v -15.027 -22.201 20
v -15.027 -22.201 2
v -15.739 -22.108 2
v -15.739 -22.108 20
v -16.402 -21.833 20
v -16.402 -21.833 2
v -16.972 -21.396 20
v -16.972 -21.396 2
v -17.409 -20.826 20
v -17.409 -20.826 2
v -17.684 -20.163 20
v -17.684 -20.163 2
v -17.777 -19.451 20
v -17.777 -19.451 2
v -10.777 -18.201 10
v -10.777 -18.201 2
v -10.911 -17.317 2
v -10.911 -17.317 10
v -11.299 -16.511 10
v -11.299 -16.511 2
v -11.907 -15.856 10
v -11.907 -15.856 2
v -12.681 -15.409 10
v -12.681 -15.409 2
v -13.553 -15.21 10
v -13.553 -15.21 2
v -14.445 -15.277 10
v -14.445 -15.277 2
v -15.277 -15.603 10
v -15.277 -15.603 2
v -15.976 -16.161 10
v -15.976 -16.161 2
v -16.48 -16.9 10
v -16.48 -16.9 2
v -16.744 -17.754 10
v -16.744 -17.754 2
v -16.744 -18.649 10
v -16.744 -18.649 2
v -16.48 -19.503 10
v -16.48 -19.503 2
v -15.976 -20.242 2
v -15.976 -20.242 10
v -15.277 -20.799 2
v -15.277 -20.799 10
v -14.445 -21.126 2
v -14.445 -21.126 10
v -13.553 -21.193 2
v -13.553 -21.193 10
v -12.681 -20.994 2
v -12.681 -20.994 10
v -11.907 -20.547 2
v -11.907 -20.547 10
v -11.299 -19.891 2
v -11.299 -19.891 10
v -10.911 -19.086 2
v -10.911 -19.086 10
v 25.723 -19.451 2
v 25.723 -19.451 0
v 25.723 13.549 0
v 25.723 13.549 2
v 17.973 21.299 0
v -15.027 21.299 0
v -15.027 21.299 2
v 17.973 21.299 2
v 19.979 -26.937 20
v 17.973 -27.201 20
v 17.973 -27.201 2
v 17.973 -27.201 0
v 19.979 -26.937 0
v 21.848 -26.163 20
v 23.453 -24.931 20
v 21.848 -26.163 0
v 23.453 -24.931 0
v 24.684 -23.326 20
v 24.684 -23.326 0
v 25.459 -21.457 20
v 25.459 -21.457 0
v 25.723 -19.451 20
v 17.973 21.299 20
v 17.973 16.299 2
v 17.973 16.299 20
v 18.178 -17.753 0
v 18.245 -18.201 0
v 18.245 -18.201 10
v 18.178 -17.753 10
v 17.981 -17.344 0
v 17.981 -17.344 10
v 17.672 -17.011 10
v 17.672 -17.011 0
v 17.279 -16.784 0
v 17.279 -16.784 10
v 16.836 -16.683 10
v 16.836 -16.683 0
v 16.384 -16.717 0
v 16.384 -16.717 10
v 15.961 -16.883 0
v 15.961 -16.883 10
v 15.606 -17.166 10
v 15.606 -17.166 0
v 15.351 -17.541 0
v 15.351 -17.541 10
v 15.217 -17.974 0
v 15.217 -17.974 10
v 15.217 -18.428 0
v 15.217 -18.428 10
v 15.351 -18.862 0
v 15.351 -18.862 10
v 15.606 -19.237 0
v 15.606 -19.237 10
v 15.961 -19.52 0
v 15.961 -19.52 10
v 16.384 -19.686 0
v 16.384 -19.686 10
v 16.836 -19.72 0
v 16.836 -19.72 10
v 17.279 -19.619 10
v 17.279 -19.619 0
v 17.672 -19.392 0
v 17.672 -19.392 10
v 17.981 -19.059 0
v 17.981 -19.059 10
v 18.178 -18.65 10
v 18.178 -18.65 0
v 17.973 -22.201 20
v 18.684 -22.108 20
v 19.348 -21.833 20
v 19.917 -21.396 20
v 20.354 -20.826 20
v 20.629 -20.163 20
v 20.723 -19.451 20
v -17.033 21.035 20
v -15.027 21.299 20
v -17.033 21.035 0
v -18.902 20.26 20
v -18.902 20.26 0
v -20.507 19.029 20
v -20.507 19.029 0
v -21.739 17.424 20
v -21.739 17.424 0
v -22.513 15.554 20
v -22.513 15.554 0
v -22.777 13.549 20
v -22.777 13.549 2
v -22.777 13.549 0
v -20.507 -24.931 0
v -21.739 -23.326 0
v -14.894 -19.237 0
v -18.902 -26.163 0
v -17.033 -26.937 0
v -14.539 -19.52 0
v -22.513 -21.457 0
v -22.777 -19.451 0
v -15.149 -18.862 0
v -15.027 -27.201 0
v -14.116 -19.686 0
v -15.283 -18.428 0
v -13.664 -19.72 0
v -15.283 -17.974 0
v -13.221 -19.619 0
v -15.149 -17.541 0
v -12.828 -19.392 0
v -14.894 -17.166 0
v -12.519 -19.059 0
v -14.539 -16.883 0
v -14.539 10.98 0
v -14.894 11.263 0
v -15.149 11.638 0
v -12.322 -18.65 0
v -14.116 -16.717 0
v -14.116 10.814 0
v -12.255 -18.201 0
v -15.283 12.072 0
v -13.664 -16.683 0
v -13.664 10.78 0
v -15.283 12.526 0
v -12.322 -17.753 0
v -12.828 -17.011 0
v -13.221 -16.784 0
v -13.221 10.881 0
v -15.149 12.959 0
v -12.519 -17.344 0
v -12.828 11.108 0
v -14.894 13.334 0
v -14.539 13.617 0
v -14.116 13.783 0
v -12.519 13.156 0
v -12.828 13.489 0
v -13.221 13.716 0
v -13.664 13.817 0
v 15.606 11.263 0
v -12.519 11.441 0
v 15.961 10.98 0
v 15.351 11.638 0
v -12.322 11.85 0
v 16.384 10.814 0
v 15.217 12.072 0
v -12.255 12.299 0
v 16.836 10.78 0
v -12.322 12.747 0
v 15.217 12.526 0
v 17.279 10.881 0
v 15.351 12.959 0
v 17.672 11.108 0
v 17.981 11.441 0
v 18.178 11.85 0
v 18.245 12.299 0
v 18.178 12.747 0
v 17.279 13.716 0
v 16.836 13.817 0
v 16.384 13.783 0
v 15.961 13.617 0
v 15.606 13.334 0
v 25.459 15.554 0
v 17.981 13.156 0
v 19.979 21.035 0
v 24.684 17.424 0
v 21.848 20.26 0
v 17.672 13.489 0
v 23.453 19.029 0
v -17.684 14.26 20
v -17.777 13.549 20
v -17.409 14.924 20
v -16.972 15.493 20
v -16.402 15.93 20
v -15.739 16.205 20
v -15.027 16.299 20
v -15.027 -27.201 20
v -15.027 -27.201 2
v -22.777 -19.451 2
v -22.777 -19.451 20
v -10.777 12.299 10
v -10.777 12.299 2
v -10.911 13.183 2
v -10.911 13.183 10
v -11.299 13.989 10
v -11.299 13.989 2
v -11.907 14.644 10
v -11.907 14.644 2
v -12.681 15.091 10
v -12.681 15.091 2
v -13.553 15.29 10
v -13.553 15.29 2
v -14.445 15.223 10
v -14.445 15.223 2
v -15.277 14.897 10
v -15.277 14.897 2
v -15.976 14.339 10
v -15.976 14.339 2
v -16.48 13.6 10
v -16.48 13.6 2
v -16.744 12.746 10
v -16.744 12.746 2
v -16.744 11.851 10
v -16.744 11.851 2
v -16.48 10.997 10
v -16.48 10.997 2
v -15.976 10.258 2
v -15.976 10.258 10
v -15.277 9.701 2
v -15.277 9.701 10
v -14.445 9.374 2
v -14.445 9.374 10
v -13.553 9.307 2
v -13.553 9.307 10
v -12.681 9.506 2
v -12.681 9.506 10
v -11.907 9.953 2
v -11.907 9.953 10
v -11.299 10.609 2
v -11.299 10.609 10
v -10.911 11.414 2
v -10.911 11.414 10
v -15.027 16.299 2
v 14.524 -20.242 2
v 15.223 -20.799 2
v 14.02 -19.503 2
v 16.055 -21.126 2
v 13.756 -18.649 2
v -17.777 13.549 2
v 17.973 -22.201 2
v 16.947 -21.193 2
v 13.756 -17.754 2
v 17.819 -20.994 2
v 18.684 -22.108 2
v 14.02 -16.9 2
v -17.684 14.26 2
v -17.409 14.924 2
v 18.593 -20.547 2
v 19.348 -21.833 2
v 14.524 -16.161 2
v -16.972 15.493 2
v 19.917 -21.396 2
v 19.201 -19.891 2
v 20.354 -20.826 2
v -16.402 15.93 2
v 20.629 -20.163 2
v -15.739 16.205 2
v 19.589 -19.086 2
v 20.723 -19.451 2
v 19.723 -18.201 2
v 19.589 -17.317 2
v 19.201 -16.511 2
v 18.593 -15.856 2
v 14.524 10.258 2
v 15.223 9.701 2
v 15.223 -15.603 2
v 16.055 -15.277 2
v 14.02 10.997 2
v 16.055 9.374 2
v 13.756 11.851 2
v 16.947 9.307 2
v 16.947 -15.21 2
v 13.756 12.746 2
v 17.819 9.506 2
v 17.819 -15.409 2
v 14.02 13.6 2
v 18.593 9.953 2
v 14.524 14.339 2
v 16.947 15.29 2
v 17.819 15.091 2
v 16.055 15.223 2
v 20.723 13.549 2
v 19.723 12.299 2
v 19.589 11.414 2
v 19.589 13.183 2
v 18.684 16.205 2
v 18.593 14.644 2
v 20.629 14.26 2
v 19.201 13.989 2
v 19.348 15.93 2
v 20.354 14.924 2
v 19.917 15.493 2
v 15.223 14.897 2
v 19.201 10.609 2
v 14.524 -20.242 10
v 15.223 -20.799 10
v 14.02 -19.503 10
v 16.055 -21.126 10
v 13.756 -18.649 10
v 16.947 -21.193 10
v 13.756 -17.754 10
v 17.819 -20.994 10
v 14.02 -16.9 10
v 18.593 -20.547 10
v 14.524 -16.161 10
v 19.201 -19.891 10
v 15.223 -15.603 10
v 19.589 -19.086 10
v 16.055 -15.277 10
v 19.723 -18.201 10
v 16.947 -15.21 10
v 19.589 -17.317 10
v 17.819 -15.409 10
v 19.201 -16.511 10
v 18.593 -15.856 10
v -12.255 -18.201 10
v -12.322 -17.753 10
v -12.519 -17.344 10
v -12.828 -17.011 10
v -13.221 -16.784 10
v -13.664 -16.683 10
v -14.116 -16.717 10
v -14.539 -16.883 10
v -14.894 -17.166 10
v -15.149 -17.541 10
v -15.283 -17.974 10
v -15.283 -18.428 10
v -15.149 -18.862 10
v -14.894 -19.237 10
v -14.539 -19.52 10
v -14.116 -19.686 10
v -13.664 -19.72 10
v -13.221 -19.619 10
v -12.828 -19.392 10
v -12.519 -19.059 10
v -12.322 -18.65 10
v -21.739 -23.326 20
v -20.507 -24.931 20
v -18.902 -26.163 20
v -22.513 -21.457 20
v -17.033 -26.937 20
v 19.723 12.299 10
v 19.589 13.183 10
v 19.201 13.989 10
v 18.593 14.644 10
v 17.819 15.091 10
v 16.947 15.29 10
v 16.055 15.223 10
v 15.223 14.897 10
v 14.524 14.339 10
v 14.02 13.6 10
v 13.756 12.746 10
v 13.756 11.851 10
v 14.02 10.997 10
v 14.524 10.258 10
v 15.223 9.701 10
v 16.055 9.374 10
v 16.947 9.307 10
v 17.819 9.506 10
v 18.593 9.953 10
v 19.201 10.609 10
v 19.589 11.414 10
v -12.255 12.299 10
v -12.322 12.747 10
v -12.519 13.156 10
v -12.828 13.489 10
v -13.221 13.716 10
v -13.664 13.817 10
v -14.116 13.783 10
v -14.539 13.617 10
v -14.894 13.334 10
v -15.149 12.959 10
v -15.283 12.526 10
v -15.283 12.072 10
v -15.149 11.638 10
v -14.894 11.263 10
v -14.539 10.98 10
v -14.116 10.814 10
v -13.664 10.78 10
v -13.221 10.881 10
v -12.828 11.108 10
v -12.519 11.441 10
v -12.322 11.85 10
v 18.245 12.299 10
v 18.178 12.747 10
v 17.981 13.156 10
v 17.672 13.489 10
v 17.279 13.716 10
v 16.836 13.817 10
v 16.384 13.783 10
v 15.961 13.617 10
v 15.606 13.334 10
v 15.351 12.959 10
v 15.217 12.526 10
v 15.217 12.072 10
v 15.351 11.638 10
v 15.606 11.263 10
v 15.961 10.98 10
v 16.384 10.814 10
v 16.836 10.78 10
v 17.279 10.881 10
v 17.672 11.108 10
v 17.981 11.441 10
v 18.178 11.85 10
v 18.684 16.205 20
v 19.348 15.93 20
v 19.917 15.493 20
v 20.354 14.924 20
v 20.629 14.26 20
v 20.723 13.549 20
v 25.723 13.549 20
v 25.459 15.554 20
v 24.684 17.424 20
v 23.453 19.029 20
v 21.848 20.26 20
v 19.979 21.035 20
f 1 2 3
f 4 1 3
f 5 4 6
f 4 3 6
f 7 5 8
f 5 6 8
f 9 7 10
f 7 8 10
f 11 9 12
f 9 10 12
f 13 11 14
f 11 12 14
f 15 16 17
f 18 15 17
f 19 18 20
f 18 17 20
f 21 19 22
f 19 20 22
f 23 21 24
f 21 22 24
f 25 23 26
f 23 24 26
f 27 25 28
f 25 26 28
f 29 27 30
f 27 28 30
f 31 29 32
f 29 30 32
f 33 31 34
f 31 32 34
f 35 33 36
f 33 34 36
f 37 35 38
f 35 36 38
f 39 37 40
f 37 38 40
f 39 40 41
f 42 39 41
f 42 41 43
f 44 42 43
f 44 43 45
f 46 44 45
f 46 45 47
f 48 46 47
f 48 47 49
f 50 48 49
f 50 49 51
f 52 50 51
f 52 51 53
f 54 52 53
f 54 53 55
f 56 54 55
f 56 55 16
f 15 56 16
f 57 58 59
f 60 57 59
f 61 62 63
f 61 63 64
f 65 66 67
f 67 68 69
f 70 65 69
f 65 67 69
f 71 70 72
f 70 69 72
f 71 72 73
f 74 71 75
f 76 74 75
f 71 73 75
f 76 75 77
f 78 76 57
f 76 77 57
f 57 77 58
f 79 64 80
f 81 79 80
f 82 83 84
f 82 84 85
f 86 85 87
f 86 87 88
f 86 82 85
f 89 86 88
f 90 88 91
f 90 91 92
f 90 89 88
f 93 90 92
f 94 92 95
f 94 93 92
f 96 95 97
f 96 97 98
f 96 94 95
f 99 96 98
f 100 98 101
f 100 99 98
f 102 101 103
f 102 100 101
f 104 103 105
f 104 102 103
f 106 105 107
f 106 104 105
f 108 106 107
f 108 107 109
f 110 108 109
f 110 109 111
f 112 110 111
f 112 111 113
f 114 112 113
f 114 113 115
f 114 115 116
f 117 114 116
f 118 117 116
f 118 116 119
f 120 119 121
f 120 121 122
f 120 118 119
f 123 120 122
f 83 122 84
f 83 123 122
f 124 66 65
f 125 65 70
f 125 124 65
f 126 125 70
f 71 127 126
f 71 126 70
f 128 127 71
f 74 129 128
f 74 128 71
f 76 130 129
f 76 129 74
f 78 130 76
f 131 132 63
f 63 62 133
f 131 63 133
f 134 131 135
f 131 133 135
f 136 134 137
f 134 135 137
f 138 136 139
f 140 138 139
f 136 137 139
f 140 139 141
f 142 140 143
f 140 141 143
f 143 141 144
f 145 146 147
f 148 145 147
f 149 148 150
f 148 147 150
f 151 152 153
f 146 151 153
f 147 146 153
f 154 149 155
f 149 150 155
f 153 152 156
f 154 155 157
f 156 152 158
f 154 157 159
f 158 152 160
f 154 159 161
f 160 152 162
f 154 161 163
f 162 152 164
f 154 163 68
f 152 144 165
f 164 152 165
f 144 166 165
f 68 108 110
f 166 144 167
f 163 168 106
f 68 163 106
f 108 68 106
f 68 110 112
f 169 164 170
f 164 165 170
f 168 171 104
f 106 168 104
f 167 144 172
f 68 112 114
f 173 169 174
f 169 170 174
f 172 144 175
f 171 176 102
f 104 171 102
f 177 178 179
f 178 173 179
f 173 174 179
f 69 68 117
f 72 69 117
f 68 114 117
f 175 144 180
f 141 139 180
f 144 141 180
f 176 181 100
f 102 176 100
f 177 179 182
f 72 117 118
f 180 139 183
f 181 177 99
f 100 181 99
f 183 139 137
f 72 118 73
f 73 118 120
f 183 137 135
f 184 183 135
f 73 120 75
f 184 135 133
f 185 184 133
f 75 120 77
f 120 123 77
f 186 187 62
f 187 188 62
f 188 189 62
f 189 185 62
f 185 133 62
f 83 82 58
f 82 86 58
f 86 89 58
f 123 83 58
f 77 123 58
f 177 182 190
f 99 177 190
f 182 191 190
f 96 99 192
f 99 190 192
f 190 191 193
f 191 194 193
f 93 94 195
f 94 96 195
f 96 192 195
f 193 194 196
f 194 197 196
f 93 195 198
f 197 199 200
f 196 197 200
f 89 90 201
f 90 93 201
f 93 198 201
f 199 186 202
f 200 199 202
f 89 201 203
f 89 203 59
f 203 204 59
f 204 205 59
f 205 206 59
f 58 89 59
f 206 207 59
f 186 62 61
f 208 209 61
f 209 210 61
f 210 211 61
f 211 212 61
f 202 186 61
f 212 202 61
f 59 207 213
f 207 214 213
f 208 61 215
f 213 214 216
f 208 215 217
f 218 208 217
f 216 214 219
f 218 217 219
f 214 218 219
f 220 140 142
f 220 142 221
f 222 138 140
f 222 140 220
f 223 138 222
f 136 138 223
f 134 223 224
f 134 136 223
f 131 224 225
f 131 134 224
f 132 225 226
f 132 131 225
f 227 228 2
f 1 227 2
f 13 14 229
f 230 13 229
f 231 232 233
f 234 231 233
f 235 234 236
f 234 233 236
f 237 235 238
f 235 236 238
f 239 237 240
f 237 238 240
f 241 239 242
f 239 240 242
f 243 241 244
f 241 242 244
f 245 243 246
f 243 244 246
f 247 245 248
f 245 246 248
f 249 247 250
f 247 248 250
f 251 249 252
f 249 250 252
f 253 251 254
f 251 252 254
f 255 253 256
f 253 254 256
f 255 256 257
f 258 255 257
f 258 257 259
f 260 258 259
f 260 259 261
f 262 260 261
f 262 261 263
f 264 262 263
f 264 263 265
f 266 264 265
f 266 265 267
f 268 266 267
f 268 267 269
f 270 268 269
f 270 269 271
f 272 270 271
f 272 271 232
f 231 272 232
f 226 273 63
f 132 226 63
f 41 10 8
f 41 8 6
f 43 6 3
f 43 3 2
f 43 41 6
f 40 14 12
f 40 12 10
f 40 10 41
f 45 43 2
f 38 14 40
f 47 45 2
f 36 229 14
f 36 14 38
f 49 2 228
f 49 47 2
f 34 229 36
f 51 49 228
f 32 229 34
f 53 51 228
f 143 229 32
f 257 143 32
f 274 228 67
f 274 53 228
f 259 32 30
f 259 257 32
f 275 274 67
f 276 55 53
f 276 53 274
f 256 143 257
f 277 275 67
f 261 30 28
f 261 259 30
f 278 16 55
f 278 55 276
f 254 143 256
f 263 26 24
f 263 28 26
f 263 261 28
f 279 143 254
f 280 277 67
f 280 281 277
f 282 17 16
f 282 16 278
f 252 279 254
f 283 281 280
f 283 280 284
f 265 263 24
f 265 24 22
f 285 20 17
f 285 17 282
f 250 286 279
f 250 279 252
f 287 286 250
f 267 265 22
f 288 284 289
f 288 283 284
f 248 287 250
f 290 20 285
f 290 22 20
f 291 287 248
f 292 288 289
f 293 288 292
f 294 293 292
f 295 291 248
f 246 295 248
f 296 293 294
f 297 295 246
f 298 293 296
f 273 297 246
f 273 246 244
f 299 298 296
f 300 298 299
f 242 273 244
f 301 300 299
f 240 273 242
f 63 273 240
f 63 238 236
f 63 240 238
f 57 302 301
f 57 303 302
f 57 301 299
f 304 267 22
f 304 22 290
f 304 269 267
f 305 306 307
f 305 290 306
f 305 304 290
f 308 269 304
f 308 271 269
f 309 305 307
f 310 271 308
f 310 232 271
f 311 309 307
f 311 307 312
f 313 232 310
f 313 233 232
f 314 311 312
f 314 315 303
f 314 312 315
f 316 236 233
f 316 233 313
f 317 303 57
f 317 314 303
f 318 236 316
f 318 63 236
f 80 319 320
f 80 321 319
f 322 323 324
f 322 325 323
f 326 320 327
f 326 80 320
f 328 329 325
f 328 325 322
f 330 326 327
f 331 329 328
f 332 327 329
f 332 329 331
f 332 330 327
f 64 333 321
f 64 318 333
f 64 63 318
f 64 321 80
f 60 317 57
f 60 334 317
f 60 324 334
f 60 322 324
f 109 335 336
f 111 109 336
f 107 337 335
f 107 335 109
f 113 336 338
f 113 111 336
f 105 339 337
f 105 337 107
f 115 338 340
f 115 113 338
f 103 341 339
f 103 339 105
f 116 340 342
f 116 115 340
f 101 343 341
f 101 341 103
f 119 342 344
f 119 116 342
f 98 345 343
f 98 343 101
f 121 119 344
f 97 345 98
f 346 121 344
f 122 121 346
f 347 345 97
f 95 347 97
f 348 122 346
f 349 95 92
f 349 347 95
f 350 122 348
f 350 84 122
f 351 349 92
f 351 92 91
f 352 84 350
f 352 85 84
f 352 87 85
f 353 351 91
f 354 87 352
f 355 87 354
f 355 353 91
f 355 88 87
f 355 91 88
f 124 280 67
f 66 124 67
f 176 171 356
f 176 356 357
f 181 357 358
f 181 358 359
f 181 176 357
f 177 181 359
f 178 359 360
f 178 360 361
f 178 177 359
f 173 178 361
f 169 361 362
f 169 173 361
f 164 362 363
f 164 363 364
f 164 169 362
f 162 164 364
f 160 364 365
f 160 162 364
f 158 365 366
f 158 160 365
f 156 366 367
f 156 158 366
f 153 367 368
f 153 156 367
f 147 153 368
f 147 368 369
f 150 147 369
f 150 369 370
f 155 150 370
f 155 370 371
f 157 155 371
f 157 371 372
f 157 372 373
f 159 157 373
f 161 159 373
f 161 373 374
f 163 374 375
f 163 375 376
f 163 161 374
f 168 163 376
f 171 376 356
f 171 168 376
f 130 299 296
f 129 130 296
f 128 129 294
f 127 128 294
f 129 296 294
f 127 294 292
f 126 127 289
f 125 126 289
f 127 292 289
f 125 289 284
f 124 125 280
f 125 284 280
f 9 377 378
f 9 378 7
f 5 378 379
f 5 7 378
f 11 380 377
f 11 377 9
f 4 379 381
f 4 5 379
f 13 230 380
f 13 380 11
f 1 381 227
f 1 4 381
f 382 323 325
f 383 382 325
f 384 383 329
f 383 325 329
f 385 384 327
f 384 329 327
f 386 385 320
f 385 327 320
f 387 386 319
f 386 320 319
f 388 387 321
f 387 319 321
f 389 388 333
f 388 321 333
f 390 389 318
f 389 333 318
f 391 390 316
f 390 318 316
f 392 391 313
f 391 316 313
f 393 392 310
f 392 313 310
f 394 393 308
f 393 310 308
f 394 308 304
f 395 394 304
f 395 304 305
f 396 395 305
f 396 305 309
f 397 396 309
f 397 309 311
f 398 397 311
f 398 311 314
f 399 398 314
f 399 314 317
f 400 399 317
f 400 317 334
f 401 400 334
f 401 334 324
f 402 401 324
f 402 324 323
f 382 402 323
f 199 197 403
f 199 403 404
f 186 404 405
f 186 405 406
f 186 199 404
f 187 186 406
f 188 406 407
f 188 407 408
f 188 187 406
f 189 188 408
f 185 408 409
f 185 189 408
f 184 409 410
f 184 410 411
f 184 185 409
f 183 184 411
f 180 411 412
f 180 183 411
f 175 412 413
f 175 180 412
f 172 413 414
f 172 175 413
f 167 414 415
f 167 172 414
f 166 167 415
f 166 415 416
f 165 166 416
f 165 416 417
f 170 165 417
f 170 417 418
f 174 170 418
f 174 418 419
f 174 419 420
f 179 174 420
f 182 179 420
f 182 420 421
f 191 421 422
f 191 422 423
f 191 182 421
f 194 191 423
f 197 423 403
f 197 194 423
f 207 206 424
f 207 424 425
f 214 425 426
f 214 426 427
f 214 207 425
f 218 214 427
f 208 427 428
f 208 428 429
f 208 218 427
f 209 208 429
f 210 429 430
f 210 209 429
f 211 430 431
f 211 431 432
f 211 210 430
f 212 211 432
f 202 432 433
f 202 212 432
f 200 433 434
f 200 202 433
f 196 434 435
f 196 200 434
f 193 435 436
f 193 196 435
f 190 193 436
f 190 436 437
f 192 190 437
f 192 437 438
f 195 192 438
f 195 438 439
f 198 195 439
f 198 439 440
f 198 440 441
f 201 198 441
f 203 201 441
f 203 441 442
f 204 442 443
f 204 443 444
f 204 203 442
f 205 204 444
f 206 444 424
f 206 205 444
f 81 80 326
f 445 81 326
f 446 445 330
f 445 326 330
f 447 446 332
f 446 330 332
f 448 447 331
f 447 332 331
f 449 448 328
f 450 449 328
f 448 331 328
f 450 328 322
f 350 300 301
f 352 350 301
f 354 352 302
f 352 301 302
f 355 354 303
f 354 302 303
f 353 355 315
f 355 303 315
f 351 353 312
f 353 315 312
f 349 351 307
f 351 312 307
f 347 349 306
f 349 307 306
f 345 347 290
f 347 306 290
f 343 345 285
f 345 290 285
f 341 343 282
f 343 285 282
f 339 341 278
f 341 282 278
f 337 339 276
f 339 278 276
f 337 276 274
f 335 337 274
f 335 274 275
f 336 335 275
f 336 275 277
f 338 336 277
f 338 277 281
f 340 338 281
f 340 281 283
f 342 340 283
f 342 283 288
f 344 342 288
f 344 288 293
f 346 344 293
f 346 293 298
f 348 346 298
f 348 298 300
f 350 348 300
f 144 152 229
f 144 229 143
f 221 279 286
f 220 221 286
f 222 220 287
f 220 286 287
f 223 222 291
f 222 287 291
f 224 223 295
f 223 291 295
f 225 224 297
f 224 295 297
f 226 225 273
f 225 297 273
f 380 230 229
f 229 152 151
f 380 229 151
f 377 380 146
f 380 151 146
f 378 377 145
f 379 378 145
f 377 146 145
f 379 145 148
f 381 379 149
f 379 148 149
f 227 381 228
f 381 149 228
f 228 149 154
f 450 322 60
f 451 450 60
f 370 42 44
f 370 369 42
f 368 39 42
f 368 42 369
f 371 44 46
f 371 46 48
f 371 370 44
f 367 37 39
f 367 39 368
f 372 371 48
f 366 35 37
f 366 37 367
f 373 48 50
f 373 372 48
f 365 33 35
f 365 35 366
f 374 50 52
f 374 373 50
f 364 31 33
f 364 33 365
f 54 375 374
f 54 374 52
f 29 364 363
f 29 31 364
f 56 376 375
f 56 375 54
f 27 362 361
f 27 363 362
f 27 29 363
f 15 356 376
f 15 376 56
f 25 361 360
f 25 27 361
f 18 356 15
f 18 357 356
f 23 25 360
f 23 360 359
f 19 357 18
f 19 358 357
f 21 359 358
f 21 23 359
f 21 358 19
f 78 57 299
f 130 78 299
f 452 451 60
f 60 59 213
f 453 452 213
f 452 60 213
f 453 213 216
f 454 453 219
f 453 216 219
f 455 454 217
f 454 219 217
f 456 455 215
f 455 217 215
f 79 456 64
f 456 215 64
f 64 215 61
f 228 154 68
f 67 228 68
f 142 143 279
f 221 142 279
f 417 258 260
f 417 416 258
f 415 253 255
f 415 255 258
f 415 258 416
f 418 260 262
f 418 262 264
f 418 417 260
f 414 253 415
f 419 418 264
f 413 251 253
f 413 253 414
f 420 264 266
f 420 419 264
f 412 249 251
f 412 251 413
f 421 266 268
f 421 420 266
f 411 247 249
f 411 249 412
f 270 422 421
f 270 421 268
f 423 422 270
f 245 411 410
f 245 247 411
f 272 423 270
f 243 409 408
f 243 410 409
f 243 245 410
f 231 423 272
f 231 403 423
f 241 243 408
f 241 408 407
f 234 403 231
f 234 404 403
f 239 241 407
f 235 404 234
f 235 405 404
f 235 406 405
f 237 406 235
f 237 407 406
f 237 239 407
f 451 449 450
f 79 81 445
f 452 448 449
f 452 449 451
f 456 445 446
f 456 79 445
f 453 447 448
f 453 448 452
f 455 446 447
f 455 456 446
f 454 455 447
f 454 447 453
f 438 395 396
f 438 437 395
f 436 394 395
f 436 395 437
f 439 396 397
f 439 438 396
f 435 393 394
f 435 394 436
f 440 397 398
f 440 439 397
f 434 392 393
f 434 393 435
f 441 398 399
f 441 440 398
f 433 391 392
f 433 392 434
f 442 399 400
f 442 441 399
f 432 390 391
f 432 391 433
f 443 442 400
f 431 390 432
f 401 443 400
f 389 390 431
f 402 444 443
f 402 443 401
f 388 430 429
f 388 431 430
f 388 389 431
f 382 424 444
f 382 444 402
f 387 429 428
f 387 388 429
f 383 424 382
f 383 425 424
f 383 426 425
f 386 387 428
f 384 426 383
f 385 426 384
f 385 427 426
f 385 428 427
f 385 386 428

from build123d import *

# Parameters (mm, degrees)
F0_W     = 33
F0_H     = 5
F0_W_2   = 5
F0_H_2   = 33
F0_R     = 3
F1_DEPTH = 2
F2_DEPTH = 20
F0_R_2   = 1.522733
F3_DEPTH = 10


with BuildPart() as f1:
    # F0 (on Top) → F1 (new body)
    with BuildSketch(Plane.XY):
        with Locations((1.472682, 18.798609)):
            Rectangle(F0_W, F0_H)
        with Locations((-20.277318, -2.951391)):
            Rectangle(F0_W_2, F0_H_2)
        with BuildLine():
            Line((17.972682, 16.298609), (-15.027318, 16.298609))
            ThreePointArc((-15.027318, 16.298609), (-16.971862, 15.493153), (-17.777318, 13.548609))
            Line((-17.777318, 13.548609), (-17.777318, -19.451391))
            ThreePointArc((-17.777318, -19.451391), (-16.971862, -21.395934), (-15.027318, -22.201391))
            Line((-15.027318, -22.201391), (17.972682, -22.201391))
            ThreePointArc((17.972682, -22.201391), (19.917226, -21.395934), (20.722682, -19.451391))
            Line((20.722682, -19.451391), (20.722682, 13.548609))
            ThreePointArc((20.722682, 13.548609), (19.917226, 15.493153), (17.972682, 16.298609))
        make_face()
        with Locations((-13.777318, -18.201391)):
            Circle(F0_R, mode=Mode.SUBTRACT)
        with Locations((16.722682, -18.201391)):
            Circle(F0_R, mode=Mode.SUBTRACT)
        with Locations((-13.777318, 12.298609)):
            Circle(F0_R, mode=Mode.SUBTRACT)
        with Locations((16.722682, 12.298609)):
            Circle(F0_R, mode=Mode.SUBTRACT)
        with Locations((23.222682, -2.951391)):
            Rectangle(F0_W_2, F0_H_2)
        with Locations((1.472682, -24.701391)):
            Rectangle(F0_W, F0_H)
    extrude(amount=F1_DEPTH)

    # F0 (on Top) → F2 (join)
    with BuildSketch(Plane.XY):
        with BuildLine():
            ThreePointArc((-17.777318, 13.548609), (-16.971862, 15.493153), (-15.027318, 16.298609))
            Line((-15.027318, 16.298609), (-15.027318, 21.298609))
            ThreePointArc((-15.027318, 21.298609), (-20.507395, 19.028687), (-22.777318, 13.548609))
            Line((-22.777318, 13.548609), (-17.777318, 13.548609))
        make_face()
        with BuildLine():
            Line((17.972682, 21.298609), (17.972682, 16.298609))
            ThreePointArc((17.972682, 16.298609), (19.917226, 15.493153), (20.722682, 13.548609))
            Line((20.722682, 13.548609), (25.722682, 13.548609))
            ThreePointArc((25.722682, 13.548609), (23.45276, 19.028687), (17.972682, 21.298609))
        make_face()
        with BuildLine():
            Line((25.722682, -19.451391), (20.722682, -19.451391))
            ThreePointArc((20.722682, -19.451391), (19.917226, -21.395934), (17.972682, -22.201391))
            Line((17.972682, -22.201391), (17.972682, -27.201391))
            ThreePointArc((17.972682, -27.201391), (23.45276, -24.931468), (25.722682, -19.451391))
        make_face()
        with BuildLine():
            ThreePointArc((-15.027318, -22.201391), (-16.971862, -21.395934), (-17.777318, -19.451391))
            Line((-17.777318, -19.451391), (-22.777318, -19.451391))
            ThreePointArc((-22.777318, -19.451391), (-20.507395, -24.931468), (-15.027318, -27.201391))
            Line((-15.027318, -27.201391), (-15.027318, -22.201391))
        make_face()
    extrude(amount=F2_DEPTH)

    # F0 (on Top) → F3 (join)
    with BuildSketch(Plane.XY):
        with Locations((-13.777318, 12.298609)):
            Circle(F0_R)
        with Locations((-13.777318, 12.298609)):
            Circle(F0_R_2, mode=Mode.SUBTRACT)
        with Locations((16.722682, 12.298609)):
            Circle(F0_R)
        with Locations((16.722682, 12.298609)):
            Circle(F0_R_2, mode=Mode.SUBTRACT)
        with Locations((16.722682, -18.201391)):
            Circle(F0_R)
        with Locations((16.722682, -18.201391)):
            Circle(F0_R_2, mode=Mode.SUBTRACT)
        with Locations((-13.777318, -18.201391)):
            Circle(F0_R)
        with Locations((-13.777318, -18.201391)):
            Circle(F0_R_2, mode=Mode.SUBTRACT)
    extrude(amount=F3_DEPTH)


solid = f1.part
